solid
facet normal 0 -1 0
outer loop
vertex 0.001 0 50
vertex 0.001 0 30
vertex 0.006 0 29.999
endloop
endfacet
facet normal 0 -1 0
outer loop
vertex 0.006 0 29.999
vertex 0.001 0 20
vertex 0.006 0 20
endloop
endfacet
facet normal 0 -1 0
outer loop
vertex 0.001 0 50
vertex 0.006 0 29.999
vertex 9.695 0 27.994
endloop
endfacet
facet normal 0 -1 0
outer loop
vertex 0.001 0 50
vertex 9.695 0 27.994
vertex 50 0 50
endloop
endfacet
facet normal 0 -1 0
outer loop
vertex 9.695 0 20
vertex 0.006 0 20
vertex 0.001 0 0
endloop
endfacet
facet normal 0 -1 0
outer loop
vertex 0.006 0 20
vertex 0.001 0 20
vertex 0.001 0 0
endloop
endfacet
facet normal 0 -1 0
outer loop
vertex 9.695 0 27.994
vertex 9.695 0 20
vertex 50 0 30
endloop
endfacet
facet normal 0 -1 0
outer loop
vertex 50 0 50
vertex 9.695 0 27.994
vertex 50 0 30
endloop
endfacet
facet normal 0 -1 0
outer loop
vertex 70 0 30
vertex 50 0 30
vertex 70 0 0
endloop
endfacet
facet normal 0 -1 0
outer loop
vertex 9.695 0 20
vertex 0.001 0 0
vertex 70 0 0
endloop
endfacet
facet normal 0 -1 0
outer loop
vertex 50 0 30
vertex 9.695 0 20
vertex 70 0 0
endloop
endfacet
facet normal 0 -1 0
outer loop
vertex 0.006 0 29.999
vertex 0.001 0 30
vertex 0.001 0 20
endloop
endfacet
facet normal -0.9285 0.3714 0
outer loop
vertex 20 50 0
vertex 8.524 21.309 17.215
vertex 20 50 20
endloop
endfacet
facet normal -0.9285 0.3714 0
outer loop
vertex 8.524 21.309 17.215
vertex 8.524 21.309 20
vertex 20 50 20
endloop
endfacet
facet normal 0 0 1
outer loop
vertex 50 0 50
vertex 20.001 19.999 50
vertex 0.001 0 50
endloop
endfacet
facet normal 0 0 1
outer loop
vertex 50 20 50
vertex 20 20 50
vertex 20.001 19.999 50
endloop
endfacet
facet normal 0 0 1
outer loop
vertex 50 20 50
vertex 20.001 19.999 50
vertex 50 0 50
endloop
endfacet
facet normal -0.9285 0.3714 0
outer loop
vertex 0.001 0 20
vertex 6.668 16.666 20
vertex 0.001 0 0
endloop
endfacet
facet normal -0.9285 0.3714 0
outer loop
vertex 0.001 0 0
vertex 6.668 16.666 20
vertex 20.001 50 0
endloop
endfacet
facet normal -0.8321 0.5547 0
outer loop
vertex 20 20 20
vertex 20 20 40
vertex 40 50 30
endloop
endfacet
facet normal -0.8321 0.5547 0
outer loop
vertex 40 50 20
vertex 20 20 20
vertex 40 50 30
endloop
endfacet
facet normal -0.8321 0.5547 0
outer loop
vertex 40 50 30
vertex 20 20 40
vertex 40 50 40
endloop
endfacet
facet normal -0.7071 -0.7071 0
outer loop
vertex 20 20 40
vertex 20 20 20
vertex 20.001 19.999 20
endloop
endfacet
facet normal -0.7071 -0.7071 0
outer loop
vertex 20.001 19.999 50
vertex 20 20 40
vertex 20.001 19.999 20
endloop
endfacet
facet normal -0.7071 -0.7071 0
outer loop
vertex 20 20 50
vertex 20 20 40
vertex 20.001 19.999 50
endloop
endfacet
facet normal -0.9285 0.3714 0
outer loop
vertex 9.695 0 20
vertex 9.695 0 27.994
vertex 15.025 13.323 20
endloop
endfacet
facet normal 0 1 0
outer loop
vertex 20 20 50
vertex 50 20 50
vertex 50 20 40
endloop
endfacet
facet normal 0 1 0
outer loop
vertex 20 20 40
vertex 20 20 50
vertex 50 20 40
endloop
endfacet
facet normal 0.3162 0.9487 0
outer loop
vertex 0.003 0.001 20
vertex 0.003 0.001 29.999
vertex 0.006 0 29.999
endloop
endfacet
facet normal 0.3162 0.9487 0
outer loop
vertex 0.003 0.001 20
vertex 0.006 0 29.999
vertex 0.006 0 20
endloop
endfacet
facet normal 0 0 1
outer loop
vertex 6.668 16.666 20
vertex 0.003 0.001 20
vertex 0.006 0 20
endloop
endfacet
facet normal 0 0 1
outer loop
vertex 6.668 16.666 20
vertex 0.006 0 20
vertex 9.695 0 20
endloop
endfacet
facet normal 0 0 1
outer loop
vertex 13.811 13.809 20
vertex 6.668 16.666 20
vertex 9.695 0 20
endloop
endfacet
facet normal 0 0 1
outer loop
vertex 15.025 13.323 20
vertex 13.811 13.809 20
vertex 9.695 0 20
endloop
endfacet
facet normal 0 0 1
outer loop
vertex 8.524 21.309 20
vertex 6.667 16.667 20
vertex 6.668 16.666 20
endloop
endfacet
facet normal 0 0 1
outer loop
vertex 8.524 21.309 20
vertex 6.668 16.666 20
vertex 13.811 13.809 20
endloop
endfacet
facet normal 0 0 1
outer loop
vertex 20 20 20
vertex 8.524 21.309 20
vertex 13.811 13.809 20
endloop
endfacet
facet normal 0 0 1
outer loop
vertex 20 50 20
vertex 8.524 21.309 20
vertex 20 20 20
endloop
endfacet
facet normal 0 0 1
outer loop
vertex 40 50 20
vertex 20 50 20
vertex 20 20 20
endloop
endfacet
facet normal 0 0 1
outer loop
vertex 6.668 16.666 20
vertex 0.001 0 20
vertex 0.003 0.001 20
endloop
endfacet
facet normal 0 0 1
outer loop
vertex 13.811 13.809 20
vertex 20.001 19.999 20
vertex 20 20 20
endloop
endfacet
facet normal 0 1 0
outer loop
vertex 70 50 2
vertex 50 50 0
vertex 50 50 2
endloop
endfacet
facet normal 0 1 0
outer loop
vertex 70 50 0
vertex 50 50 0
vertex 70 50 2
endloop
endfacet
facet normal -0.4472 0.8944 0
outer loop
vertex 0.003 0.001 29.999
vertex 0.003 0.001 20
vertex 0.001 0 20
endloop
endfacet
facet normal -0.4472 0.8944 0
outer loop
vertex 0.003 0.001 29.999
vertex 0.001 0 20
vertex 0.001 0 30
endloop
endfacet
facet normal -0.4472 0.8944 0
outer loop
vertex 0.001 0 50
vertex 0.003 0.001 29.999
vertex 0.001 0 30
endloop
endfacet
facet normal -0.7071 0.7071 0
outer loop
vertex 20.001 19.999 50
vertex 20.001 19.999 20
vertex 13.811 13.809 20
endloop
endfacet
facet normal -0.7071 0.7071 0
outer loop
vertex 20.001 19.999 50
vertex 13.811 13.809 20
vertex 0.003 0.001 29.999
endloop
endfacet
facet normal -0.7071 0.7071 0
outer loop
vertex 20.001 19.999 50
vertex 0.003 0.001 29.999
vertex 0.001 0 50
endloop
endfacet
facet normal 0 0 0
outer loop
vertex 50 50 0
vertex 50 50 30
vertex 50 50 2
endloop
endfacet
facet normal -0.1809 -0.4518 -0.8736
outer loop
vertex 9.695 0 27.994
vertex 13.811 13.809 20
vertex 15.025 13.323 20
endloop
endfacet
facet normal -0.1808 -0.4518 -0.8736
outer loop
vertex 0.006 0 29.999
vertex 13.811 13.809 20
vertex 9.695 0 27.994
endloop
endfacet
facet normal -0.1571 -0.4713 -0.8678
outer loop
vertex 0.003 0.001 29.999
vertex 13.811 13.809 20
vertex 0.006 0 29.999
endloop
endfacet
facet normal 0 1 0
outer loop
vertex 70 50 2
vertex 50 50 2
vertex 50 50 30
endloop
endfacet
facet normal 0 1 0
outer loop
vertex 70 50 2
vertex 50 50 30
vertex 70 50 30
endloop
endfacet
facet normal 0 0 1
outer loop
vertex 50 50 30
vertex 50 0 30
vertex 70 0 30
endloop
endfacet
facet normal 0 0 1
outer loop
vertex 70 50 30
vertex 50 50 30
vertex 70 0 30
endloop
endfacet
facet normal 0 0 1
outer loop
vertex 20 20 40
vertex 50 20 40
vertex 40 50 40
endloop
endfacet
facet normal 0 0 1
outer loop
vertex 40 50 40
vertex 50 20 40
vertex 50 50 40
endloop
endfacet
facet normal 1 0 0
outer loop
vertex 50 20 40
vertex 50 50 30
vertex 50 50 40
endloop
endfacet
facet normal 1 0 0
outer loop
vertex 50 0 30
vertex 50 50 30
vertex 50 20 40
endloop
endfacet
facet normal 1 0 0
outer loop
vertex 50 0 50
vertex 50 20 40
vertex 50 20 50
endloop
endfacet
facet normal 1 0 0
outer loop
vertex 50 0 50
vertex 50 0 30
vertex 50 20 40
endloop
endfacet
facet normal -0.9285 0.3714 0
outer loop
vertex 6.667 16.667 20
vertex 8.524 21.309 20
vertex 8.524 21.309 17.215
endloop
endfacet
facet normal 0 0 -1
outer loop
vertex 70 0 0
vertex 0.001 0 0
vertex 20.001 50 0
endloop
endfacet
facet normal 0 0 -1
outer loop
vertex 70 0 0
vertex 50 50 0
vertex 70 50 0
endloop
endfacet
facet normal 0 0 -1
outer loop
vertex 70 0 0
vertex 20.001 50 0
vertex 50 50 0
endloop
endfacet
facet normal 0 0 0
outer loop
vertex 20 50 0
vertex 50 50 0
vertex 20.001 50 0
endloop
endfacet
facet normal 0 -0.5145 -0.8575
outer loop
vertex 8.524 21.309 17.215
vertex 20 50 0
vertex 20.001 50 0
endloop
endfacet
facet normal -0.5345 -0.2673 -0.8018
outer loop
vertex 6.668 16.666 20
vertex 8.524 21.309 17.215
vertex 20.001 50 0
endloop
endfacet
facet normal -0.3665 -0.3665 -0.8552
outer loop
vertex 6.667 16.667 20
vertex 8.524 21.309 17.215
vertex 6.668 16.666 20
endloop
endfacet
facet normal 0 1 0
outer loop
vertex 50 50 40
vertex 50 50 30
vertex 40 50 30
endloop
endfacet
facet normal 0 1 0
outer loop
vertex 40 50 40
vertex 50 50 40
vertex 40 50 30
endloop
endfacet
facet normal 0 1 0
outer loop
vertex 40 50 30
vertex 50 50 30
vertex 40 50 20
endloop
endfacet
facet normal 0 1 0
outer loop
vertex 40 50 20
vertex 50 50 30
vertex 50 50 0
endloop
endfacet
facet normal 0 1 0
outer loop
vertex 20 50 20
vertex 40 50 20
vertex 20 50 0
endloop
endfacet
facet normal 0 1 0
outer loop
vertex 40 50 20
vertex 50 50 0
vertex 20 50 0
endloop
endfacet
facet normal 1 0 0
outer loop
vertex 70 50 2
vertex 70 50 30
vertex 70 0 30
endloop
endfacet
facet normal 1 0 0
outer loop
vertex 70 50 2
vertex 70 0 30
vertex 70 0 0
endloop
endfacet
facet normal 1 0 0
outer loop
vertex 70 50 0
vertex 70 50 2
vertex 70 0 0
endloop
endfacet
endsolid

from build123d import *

# Parameters (mm, degrees)
SKETCH1_W            = 70
SKETCH1_H            = 50
BOSS_EXTRUDE1_DEPTH  = 50
CUT_EXTRUDE1_DEPTH   = 50
SKETCH3_W            = 10
SKETCH3_H            = 30
CUT_EXTRUDE2_DEPTH   = 121
SKETCH4_W            = 20
SKETCH4_H            = 20
CUT_EXTRUDE3_DEPTH   = 121
CUT_EXTRUDE8_DEPTH   = 30
CUT_EXTRUDE9_DEPTH   = 0.0001
SKETCH11_W           = 20
SKETCH11_H           = 2
BOSS_EXTRUDE8_DEPTH  = 0.0001
SKETCH12_W           = 20
SKETCH12_H           = 20
CUT_EXTRUDE10_DEPTH  = 0.0001
CUT_EXTRUDE11_DEPTH  = 0.001
CUT_EXTRUDE12_DEPTH  = 0.001
CUT_EXTRUDE13_DEPTH  = 9.001
BOSS_EXTRUDE14_DEPTH = 0.0002
SKETCH18_W           = 30
SKETCH18_H           = 28.284271247
CUT_EXTRUDE17_DEPTH  = 23.0002
CUT_EXTRUDE18_DEPTH  = 0.0001


with BuildPart() as part:
    # Sketch1 → Boss-Extrude1 (new body)
    with BuildSketch(Plane.XY):
        with Locations((35, 25)):
            Rectangle(SKETCH1_W, SKETCH1_H)
    extrude(amount=BOSS_EXTRUDE1_DEPTH)

    # Sketch2 → Cut-Extrude1 (cut)
    with BuildSketch(Plane.XY.offset(50)):
        Polygon((0, 0), (20, 50), (0, 50), align=None)
    extrude(amount=-CUT_EXTRUDE1_DEPTH, mode=Mode.SUBTRACT)

    # Sketch3 → Cut-Extrude2 (cut)
    with BuildSketch(Plane(origin=(70, 0, 0), x_dir=(0, 0, -1), z_dir=(1, 0, 0))):
        with Locations((-45, 35)):
            Rectangle(SKETCH3_W, SKETCH3_H)
    extrude(amount=-CUT_EXTRUDE2_DEPTH, mode=Mode.SUBTRACT)

    # Sketch4 → Cut-Extrude3 (cut)
    with BuildSketch(Plane.XZ):
        with Locations((60, 40)):
            Rectangle(SKETCH4_W, SKETCH4_H)
    extrude(amount=-CUT_EXTRUDE3_DEPTH, mode=Mode.SUBTRACT)

    # Sketch5 → Cut-Extrude8 (cut)
    with BuildSketch(Plane.XY.offset(50)):
        Polygon((0, 0), (20, 20), (40, 50), (20, 50), align=None)
    extrude(amount=-CUT_EXTRUDE8_DEPTH, mode=Mode.SUBTRACT)

    # Sketch10 → Cut-Extrude9 (cut)
    with BuildSketch(Plane(origin=(0, 50, 0), x_dir=(1, 0, 0), z_dir=(0, 1, 0))):
        Polygon((20, 0), (50, 0), (50, -40), (40, -40), (40, -10), (20, -10), align=None)
    extrude(amount=-CUT_EXTRUDE9_DEPTH, mode=Mode.SUBTRACT)

    # Sketch11 → Boss-Extrude8 (add)
    with BuildSketch(Plane(origin=(0, 50, 0), x_dir=(1, 0, 0), z_dir=(0, 1, 0))):
        with Locations((60, -1)):
            Rectangle(SKETCH11_W, SKETCH11_H)
    extrude(amount=BOSS_EXTRUDE8_DEPTH)

    # Sketch12 → Cut-Extrude10 (cut)
    with BuildSketch(Plane(origin=(0, 50, 0), x_dir=(1, 0, 0), z_dir=(0, 1, 0))):
        with Locations((30, -20)):
            Rectangle(SKETCH12_W, SKETCH12_H)
    extrude(amount=-CUT_EXTRUDE10_DEPTH, mode=Mode.SUBTRACT)

    # Sketch14 → Cut-Extrude11 (cut)
    with BuildSketch(Plane(origin=(0, 0, 0), x_dir=(0, 0, 1), z_dir=(-0.707106781, 0.707106781, 0))):
        Polygon((20, 28.284271247), (50, 28.284271247), (50, 0), (30, 0), align=None)
    extrude(amount=-CUT_EXTRUDE11_DEPTH, mode=Mode.SUBTRACT)

    # Sketch15 → Cut-Extrude12 (cut)
    with BuildSketch(Plane(origin=(0, 0, 0), x_dir=(0, 0, 1), z_dir=(-0.928476691, 0.371390676, 0))):
        Polygon((0, 53.851648071), (30, 0), (0, 0), align=None)
    extrude(amount=-CUT_EXTRUDE12_DEPTH, mode=Mode.SUBTRACT)

    # Sketch16 → Cut-Extrude13 (cut)
    with BuildSketch(Plane(origin=(0.000928477, -0.000371391, 0), x_dir=(0, 0, 1), z_dir=(-0.928476691, 0.371390676, 0))):
        Polygon((20, 17.950549357), (29.998700133, 0.002333333), (20, 0.002333333), align=None)
    extrude(amount=-CUT_EXTRUDE13_DEPTH, mode=Mode.SUBTRACT)

    # Sketch17 → Boss-Extrude14 (add)
    with BuildSketch(Plane(origin=(0, 0, 0), x_dir=(0, 0, 1), z_dir=(-0.707106781, 0.707106781, 0))):
        Polygon((20, 28.284271247), (20, 19.529615861), (30, 0), align=None)
    extrude(amount=BOSS_EXTRUDE14_DEPTH)

    # Sketch18 → Cut-Extrude17 (cut)
    with BuildSketch(Plane(origin=(0.000707107, -0.000707107, 0), x_dir=(0, 0, 1), z_dir=(-0.707106781, 0.707106781, 0))):
        with Locations((35, 14.142135624)):
            Rectangle(SKETCH18_W, SKETCH18_H)
    extrude(amount=CUT_EXTRUDE17_DEPTH, mode=Mode.SUBTRACT)

    # Sketch19 → Cut-Extrude18 (cut)
    with BuildSketch(Plane(origin=(0, 0, 0), x_dir=(0, 0, 1), z_dir=(-0.928476691, 0.371390676, 0))):
        Polygon((17.214569927, 22.950549357), (20, 22.950549357), (20, 17.950549357), align=None)
    extrude(amount=-CUT_EXTRUDE18_DEPTH, mode=Mode.SUBTRACT)


solid = part.part
